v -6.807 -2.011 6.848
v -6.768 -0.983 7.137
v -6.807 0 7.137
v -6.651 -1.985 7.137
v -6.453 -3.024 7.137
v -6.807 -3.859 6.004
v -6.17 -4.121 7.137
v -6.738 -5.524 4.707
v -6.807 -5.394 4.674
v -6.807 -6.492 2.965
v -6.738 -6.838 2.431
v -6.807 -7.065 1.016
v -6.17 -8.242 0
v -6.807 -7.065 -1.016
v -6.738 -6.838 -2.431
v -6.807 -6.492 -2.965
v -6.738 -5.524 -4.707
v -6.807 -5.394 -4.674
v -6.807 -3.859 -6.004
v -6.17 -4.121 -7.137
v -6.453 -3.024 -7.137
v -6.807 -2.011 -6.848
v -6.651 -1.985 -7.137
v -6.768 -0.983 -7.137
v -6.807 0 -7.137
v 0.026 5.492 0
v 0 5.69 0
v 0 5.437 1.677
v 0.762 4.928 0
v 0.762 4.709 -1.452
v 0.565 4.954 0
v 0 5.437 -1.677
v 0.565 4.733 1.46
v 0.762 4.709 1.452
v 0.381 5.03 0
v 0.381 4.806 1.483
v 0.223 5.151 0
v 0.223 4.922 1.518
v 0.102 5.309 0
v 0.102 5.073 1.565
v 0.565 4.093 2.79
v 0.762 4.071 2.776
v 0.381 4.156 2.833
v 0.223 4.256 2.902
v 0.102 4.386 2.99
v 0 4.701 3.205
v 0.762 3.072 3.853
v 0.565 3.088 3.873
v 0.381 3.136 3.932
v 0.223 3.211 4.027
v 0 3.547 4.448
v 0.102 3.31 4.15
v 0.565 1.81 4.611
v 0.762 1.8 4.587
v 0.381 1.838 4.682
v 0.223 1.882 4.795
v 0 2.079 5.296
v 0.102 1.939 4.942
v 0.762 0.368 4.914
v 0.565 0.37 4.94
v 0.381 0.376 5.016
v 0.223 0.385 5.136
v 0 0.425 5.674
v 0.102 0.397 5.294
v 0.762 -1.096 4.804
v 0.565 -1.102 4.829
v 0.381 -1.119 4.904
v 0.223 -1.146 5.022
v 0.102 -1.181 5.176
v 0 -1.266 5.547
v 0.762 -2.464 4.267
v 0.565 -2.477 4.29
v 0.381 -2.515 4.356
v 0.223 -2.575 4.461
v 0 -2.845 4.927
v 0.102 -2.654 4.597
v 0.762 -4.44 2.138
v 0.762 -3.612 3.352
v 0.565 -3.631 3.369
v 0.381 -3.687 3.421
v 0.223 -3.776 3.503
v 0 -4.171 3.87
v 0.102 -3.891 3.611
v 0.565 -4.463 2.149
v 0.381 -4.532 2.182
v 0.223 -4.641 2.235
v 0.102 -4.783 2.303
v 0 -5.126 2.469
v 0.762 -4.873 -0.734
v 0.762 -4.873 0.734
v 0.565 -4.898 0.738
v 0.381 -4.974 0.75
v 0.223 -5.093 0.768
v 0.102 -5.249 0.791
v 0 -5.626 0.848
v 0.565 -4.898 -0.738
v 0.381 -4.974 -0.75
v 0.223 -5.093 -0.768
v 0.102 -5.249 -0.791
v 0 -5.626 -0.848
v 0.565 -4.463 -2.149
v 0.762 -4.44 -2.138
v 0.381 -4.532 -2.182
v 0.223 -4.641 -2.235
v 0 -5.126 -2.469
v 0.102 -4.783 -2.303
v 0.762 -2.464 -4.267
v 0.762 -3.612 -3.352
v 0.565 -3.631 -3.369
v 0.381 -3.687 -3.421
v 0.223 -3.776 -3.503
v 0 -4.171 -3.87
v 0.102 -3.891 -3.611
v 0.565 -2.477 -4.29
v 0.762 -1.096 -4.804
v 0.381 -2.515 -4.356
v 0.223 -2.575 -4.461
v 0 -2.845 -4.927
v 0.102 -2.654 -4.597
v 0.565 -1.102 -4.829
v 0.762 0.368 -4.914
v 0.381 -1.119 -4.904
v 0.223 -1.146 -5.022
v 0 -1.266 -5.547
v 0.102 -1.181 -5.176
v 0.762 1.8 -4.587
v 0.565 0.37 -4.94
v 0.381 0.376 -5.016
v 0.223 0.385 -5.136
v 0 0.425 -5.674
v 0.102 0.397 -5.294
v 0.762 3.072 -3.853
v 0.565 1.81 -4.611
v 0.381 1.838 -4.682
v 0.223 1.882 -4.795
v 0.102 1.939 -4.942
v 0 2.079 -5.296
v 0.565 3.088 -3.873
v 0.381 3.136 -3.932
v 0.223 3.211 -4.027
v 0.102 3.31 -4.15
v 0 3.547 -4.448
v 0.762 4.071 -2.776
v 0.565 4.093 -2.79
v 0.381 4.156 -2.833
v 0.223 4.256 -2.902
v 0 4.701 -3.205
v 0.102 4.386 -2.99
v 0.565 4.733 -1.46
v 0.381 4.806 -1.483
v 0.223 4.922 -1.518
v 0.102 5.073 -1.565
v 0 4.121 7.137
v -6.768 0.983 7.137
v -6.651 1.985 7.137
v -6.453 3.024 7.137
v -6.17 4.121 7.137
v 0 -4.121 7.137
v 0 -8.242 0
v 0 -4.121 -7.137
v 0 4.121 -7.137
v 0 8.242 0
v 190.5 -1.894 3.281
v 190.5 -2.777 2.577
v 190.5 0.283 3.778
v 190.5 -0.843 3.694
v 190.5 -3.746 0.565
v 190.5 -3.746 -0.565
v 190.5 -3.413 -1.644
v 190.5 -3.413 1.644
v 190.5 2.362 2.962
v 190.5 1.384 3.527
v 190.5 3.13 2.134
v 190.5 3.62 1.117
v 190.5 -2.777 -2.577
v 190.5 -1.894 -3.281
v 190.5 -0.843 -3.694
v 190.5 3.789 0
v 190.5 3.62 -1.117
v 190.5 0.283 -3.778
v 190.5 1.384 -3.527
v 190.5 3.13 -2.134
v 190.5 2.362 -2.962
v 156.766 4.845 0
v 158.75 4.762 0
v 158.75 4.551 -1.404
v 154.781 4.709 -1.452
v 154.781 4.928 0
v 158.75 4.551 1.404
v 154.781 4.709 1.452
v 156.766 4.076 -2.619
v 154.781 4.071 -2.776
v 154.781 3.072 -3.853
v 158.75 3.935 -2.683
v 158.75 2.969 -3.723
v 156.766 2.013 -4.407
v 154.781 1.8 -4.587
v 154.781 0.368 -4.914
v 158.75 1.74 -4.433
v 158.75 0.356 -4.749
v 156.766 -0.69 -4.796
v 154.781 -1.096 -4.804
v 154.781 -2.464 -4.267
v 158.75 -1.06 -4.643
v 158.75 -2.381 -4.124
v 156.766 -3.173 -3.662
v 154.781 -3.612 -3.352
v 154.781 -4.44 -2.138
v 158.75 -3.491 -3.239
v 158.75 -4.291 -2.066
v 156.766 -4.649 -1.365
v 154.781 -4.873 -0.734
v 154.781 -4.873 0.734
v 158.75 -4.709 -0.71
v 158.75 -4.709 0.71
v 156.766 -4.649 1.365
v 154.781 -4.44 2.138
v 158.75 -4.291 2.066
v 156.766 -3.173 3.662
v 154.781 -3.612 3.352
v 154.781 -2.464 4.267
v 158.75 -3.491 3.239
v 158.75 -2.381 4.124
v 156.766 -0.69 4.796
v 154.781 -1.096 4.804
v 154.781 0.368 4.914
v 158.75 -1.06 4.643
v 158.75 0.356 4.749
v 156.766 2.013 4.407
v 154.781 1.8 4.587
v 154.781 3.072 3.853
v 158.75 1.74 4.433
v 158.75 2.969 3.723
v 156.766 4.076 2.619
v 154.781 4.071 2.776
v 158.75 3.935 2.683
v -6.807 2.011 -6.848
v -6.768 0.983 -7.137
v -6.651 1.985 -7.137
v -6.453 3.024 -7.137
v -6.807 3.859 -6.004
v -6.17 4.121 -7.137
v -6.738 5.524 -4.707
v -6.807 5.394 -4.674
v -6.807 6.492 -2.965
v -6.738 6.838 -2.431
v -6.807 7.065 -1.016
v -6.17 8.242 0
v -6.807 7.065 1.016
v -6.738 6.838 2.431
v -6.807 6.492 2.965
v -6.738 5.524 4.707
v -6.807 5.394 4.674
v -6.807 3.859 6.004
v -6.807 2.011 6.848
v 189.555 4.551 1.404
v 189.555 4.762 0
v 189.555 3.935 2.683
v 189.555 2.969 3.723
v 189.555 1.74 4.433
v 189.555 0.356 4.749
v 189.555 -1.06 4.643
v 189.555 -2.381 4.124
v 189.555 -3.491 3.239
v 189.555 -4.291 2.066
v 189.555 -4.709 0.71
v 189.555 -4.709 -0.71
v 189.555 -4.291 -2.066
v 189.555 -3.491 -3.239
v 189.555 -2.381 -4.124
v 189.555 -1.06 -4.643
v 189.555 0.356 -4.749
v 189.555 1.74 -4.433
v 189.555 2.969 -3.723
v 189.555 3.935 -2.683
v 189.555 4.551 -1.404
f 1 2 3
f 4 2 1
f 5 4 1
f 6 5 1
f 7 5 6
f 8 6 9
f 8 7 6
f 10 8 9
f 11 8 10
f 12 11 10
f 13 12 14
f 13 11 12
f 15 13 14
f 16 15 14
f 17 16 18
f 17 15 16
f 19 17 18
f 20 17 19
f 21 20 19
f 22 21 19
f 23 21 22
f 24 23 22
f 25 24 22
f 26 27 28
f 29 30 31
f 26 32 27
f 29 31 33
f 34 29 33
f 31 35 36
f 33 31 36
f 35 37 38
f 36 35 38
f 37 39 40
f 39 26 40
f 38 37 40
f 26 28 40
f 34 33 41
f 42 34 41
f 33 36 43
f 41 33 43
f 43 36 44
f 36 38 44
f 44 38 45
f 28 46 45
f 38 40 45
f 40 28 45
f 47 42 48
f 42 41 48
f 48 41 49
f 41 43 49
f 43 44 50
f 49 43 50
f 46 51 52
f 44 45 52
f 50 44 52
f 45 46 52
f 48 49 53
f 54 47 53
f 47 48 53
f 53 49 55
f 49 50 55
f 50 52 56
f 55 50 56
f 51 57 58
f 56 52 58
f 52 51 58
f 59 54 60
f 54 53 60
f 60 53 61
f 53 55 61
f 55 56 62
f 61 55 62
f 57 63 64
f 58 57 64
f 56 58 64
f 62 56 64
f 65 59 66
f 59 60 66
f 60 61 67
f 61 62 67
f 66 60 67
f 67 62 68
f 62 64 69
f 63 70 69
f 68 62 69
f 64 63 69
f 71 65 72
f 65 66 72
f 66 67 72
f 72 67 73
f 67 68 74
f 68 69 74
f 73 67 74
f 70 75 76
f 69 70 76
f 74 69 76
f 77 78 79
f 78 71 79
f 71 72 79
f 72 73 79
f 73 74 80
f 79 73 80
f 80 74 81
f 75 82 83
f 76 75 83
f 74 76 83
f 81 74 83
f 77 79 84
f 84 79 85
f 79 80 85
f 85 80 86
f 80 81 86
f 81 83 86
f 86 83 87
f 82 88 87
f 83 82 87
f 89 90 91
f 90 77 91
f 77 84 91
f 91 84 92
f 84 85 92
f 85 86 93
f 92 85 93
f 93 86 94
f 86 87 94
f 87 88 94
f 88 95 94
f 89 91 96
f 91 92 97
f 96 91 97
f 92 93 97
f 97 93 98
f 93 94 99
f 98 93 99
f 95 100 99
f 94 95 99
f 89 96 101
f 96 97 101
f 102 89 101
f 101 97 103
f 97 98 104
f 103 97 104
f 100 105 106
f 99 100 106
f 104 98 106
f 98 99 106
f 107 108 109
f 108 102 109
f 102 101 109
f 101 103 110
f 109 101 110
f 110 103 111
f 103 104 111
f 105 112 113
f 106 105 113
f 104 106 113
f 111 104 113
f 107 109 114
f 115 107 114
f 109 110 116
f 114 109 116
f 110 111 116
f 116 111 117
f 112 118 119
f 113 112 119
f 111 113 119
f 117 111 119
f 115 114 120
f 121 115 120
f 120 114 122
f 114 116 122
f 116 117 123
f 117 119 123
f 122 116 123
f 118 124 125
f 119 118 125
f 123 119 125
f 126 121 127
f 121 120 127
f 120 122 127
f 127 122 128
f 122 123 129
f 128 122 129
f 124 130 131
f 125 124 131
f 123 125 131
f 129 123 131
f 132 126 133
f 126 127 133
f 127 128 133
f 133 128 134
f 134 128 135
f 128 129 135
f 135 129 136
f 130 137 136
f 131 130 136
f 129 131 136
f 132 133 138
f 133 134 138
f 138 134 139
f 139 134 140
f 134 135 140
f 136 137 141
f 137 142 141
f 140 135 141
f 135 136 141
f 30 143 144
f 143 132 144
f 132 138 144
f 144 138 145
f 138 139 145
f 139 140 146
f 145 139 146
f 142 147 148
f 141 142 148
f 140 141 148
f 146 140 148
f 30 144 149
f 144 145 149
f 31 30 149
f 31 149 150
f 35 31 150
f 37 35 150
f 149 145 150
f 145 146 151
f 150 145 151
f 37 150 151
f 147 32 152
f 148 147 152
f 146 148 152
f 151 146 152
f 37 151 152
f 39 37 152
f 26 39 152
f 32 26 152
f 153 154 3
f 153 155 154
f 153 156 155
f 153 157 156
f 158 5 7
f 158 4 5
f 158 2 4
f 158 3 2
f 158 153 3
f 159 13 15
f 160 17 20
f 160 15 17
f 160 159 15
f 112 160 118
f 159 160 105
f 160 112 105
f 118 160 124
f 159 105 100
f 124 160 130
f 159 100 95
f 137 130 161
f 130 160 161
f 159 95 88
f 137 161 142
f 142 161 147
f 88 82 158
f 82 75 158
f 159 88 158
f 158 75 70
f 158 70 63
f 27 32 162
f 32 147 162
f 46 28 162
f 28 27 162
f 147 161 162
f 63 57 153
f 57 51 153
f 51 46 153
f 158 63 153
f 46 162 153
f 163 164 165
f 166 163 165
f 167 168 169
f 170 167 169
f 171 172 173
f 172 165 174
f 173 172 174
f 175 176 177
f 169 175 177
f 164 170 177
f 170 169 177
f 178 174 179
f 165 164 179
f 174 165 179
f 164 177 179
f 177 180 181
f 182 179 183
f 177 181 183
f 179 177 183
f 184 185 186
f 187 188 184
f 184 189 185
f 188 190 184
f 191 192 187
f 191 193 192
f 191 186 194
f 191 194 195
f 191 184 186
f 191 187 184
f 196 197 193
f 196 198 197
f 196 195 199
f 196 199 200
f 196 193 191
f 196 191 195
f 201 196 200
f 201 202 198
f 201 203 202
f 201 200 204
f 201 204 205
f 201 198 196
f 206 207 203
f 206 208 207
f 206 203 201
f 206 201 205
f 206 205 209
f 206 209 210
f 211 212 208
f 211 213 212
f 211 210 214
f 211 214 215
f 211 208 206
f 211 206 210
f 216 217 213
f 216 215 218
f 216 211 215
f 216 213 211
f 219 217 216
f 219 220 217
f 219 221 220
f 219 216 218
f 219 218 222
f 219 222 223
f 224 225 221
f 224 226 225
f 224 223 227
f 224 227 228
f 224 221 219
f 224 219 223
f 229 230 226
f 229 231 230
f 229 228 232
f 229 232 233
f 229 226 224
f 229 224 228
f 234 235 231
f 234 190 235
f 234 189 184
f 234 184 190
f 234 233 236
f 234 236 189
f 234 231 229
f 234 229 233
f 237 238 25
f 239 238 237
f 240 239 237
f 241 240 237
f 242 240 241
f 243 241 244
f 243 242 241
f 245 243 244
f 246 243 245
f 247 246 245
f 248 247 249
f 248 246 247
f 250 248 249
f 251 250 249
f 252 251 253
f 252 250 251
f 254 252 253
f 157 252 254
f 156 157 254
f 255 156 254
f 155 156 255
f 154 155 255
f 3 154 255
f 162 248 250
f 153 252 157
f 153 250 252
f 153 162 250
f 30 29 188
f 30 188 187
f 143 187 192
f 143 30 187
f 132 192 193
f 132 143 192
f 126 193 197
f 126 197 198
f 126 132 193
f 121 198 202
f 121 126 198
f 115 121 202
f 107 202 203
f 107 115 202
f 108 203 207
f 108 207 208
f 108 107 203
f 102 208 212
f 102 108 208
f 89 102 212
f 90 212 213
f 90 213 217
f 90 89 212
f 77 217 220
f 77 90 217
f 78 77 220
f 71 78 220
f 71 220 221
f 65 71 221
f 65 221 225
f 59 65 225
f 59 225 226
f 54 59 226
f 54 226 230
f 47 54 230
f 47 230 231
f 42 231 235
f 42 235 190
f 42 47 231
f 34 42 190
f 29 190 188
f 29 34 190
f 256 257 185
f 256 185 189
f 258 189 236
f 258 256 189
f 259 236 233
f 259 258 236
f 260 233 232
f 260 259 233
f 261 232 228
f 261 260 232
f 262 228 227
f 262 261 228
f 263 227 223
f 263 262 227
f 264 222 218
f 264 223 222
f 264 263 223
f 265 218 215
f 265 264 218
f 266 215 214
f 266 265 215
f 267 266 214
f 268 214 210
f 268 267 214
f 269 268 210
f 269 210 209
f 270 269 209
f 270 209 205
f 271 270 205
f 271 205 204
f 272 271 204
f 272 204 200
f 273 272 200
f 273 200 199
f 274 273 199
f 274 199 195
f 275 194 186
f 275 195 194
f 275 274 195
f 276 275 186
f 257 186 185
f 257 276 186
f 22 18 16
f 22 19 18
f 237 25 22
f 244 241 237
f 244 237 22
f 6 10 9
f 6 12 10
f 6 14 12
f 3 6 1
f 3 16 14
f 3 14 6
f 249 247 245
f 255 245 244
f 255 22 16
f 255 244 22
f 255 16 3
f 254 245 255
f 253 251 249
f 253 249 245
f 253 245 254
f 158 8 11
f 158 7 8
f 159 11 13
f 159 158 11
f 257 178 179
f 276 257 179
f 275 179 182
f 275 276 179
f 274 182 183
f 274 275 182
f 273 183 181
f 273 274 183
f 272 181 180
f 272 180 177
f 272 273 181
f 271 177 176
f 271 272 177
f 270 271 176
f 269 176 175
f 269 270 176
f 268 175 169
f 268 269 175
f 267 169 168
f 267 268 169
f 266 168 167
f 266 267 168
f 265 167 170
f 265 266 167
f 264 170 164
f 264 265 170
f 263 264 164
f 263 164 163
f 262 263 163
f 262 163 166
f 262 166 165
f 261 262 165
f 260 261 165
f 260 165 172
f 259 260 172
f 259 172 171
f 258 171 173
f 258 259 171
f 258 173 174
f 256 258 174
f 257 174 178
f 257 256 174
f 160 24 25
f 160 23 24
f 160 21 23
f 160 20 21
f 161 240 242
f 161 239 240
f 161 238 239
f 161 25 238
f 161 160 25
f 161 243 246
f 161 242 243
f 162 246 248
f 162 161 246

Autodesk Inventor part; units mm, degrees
ref_plane "YZ Plane" through (0, 0, 0) normal (1, 0, 0) x (0, 1, 0)
ref_plane "XZ Plane" through (0, 0, 0) normal (0, 1, 0) x (-1, 0, 0)
sketch "Sketch1" plane through (0, 0, 0) normal (0, 0, 1) x (1, 0, 0)
  line L0 (0, 7.1374) -> (0, 4.9276)
  line L1 (158.75, 4.7625) -> (190.5, 4.7625)
  line L2 (190.5, 4.7625) -> (190.5, 0)
  line L3 (190.5, 0) -> (-0.0001, 0)
  line L4 (-38.1001, 0) -> (228.6, 0) projected
  line L5 (-0.0001, 0) -> (-0.0001, 7.1374)
  line L6 (-0.0001, 7.1374) -> (0, 7.1374)
  line L7 (158.75, 4.7625) -> (154.7812, 4.9276)
  line L8 (154.7812, 4.9276) -> (0, 4.9276)
  line L9 (0, -1.4275) -> (0, 8.5649) projected
  dimension "d0" = 190.5
  dimension "d1" = 31.75
  dimension "d2" = 9.525
  dimension "d9" = 0.0001
  dimension "d10" = 14.2748
  dimension "d13" = 3.9689
  dimension "d14" = 9.8552
revolve "Body" add sketch "Sketch1" angle 360 about axis through (190.5, 0, 0) along (-1, 0, 0)
sketch "Sketch2" plane through (-0.0001, 0, 0) normal (-1, 0, 0) x (0, 0, 1)
  line L0 (0, 8.2416) -> (7.1374, 4.1208)
  line L1 (7.1374, 4.1208) -> (7.1374, -4.1208)
  line L2 (7.1374, -4.1208) -> (0, -8.2416)
  line L3 (0, -8.2416) -> (-7.1374, -4.1208)
  line L4 (-7.1374, -4.1208) -> (-7.1374, 4.1208)
  line L5 (-7.1374, 4.1208) -> (0, 8.2416)
  point P0 (0, 0)
  point P1 (0, 0)
  dimension "d11" = 14.2748
extrude "Head" add sketch "Sketch2" along normal blind 6.8072
sketch "Sketch4" plane through (0, 0, 0) normal (0, 0, 1) x (1, 0, 0)
  line L0 (-6.8073, 7.1374) -> (-6.8073, 8.2416)
  line L1 (-6.8073, 8.2416) -> (-6.1698, 8.2416)
  line L2 (-6.1698, 8.2416) -> (-6.8073, 7.1374)
  line L3 (-8.1687, 0) -> (1.3613, 0) projected
  line L4 (-0.0001, 8.2416) -> (-6.8073, 8.2416) projected
  line L5 (-6.8073, 4.1208) -> (-6.8073, 8.2416) projected
  dimension "d5" = 30
  dimension "d19" = 14.2748
revolve "Chamfer1" cut sketch "Sketch4" angle 360 about axis through (-10, 0, 0) along (1, 0, 0)
thread "Thread" size "3/8-16 UNC" class "2A" standard "ANSI Unified Screw Threads" length 31.75
chamfer "Chamfer2" distance 0.9739 distance2 0.9447 1 edges at (190.5, -4.7625, 0) measured on face at (190.5, 0.2241, 1.3065)
ref_plane "Work Plane1" through (1.525, 0, 0) normal (0, 0, 1) x (1, 0, 0)
fillet "Fillet2" radius 0.762 1 edges at (0, -4.9276, 0)
equation "\"d63\" = R"
equation "\"d11\" = SW"
equation "\"d3\" = KOH - SD"
equation "\"d15\" = GEL"
equation "\"d6\" = -0.5 * SPD + 0.5 * GD"
equation "\"d0\" = NLG"
equation "\"d1\" = GEL"
equation "\"d2\" = GD"
equation "\"d10\" = SD2"
equation "\"d14\" = BDM"
equation "\"d5\" = ANG1"
equation "\"d19\" = SW0"
equation "\"NLG\" = 190.5"
equation "\"GD\" = NND"
equation "\"BDM\" = 9.8552"
equation "\"KOH\" = 6.8072"
equation "\"GEL\" = 31.75"
equation "\"SW\" = 14.2748"
equation "\"SW0\" = SW"
equation "\"SPD\" = GD1"
equation "\"SD2\" = SW"
equation "\"SD\" = 0"
equation "\"ANG1\" = 30deg"
equation "\"GAL\" = 3.96875"
equation "\"GUL\" = 0.238 * GAL"
equation "\"R\" = 0.762"
equation "\"d62\" = -NLG - SD + GUL"
equation "\"GD1\" = 7.5773"
equation "\"THREADDIA\" = 9.525"
equation "\"TOA\" = 30deg"
equation "\"NND\" = 9.525"
equation "\"E0\" = 1.155 * SW"
properties part number "am-1055" material "Steel, Mild"
